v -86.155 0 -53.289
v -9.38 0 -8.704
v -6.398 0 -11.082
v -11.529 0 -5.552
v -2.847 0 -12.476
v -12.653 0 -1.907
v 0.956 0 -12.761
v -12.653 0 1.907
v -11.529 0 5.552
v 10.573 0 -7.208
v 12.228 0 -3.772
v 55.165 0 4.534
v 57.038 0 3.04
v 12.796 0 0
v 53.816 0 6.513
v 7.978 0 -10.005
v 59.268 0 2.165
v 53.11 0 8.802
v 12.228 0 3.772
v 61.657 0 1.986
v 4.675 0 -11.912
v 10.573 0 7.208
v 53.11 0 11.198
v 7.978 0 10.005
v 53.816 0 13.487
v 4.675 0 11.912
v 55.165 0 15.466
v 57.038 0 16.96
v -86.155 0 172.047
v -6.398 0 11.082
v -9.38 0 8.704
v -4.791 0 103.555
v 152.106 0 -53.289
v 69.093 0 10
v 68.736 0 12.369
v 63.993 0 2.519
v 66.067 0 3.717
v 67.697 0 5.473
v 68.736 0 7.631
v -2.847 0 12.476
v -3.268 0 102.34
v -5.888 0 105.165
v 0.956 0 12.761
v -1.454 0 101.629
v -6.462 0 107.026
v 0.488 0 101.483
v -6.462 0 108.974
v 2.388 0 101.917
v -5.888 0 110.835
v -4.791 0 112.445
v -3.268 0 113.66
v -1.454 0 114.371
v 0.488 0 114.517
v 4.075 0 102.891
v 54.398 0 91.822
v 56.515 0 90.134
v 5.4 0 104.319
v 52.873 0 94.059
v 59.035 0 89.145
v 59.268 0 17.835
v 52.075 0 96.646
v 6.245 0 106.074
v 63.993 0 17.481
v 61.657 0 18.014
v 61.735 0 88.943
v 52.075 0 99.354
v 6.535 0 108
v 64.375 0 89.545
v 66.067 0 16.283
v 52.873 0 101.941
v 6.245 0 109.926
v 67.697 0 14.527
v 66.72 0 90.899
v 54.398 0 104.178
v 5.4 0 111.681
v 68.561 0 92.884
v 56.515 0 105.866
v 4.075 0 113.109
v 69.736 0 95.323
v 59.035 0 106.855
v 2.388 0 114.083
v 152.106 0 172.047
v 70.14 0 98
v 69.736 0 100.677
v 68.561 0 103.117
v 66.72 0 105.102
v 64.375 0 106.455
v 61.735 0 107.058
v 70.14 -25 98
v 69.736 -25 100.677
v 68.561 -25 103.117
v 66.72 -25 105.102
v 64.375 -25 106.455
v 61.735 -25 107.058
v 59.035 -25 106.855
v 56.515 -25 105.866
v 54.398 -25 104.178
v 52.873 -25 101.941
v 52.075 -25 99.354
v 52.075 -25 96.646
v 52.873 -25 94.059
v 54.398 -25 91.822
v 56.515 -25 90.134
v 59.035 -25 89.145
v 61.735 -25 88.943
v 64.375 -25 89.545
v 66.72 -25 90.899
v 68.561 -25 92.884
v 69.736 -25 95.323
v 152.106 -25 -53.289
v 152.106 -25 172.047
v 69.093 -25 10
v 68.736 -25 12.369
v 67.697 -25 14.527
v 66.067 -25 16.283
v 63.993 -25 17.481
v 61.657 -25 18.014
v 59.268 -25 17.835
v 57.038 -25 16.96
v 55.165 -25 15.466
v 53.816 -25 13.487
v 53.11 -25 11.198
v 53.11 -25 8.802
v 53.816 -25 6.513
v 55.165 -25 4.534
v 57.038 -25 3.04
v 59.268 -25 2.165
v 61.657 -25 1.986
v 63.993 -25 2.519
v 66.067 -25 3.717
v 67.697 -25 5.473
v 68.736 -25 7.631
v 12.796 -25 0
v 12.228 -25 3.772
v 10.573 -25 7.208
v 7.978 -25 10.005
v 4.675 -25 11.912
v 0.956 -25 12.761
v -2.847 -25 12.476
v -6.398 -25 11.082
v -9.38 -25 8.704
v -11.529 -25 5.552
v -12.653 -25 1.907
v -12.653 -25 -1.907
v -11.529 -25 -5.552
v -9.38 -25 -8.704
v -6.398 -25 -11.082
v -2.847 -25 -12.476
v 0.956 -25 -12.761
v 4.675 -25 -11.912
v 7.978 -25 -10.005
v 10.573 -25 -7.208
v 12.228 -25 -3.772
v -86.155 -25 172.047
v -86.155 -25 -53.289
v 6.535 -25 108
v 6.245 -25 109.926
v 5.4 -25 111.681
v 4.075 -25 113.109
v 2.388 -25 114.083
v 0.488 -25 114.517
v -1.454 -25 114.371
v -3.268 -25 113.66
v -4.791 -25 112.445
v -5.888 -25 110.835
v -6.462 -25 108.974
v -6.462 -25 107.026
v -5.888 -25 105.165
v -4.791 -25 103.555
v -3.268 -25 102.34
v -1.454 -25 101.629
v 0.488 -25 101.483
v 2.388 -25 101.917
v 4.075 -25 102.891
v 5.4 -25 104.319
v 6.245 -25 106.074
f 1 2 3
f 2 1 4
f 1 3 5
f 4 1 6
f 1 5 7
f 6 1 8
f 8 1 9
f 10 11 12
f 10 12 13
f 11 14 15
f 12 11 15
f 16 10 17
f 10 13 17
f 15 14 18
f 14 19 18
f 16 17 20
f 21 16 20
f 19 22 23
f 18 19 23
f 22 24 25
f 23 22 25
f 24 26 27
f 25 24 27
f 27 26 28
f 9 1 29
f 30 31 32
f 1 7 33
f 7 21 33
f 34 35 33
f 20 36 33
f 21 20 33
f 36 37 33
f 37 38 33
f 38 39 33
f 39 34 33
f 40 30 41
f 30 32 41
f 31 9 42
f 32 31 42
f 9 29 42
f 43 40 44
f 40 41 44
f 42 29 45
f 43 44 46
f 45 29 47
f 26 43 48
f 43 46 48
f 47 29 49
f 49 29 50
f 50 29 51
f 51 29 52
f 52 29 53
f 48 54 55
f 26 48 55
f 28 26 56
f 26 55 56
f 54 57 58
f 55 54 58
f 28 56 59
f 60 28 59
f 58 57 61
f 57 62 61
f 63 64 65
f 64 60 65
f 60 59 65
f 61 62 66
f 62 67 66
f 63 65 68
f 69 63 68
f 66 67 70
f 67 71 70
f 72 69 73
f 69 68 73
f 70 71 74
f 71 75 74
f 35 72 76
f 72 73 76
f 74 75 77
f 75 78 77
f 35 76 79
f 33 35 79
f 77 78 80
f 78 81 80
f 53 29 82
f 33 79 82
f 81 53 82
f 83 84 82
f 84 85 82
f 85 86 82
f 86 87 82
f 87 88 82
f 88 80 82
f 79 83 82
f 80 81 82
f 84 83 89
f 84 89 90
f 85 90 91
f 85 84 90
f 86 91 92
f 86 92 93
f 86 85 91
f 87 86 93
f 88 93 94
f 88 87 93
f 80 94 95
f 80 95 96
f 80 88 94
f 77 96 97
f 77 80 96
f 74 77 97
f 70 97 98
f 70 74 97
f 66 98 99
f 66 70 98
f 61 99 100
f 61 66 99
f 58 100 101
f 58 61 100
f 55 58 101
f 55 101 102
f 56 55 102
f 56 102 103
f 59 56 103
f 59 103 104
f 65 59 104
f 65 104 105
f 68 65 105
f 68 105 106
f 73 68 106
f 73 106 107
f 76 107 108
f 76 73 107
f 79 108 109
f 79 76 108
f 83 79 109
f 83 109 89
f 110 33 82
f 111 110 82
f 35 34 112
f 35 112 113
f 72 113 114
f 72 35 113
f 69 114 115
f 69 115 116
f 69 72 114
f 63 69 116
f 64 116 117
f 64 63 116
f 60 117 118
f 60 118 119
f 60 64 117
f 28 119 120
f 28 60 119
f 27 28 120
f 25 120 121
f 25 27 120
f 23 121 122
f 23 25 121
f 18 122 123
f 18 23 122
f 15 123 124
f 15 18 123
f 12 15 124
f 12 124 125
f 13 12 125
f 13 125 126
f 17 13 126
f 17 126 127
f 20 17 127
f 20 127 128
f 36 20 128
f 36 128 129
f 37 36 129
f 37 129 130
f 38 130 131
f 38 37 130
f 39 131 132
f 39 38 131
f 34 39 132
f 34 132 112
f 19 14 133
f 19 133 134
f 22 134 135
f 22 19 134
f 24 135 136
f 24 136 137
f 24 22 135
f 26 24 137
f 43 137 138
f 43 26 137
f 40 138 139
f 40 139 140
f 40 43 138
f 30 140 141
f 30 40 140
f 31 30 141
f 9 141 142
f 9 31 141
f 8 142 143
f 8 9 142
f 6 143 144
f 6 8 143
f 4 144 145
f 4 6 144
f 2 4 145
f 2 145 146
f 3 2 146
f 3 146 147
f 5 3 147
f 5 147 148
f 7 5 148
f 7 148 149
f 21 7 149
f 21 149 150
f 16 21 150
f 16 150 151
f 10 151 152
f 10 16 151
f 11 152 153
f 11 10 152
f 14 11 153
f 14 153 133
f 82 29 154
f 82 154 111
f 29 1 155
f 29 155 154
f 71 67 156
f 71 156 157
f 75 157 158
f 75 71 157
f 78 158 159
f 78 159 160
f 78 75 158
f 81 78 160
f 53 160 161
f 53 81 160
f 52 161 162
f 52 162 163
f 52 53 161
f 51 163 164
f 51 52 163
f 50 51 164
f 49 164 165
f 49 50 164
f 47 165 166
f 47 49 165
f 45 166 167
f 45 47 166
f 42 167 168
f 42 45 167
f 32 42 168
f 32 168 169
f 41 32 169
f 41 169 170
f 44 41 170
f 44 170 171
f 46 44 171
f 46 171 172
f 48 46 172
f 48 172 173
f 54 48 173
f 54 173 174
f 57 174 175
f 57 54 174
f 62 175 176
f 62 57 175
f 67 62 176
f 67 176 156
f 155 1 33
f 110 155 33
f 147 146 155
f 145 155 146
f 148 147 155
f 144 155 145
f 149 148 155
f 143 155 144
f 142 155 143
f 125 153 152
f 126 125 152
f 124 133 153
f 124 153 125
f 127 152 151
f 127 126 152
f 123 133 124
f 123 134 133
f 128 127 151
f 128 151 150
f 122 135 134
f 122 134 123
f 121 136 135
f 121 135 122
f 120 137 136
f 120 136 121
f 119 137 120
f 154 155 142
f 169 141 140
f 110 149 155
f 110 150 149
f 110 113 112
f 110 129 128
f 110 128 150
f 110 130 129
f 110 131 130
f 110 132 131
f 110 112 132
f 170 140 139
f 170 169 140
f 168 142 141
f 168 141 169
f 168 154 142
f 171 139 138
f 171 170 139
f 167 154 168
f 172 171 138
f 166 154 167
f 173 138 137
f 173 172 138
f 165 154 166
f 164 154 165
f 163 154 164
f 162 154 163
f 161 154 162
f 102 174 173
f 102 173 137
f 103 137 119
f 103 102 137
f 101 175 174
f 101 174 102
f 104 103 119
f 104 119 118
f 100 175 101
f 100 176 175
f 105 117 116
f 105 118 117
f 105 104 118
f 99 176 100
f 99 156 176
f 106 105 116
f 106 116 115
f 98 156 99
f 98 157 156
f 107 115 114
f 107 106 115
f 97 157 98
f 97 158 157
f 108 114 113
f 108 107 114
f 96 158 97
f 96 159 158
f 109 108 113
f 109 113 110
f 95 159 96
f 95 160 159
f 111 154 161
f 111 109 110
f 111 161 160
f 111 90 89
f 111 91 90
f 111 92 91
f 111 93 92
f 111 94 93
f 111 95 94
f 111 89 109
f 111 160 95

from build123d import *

# Parameters (mm, degrees)
F0_W     = 238.260204
F0_H     = 225.335434
F0_R     = 12.796383
F0_R_2   = 8.036505
F0_R_3   = 6.535103
F0_R_4   = 9.083022
F1_DEPTH = 25


with BuildPart() as f1:
    # F0 (on Front) → F1 (new body)
    with BuildSketch(Plane.XZ):
        with Locations((32.97555, 59.378974)):
            Rectangle(F0_W, F0_H)
        Circle(F0_R, mode=Mode.SUBTRACT)
        with Locations((61.056477, 10.000178)):
            Circle(F0_R_2, mode=Mode.SUBTRACT)
        with Locations((0, 108)):
            Circle(F0_R_3, mode=Mode.SUBTRACT)
        with Locations((61.056535, 98.000178)):
            Circle(F0_R_4, mode=Mode.SUBTRACT)
    extrude(amount=F1_DEPTH)


solid = f1.part
